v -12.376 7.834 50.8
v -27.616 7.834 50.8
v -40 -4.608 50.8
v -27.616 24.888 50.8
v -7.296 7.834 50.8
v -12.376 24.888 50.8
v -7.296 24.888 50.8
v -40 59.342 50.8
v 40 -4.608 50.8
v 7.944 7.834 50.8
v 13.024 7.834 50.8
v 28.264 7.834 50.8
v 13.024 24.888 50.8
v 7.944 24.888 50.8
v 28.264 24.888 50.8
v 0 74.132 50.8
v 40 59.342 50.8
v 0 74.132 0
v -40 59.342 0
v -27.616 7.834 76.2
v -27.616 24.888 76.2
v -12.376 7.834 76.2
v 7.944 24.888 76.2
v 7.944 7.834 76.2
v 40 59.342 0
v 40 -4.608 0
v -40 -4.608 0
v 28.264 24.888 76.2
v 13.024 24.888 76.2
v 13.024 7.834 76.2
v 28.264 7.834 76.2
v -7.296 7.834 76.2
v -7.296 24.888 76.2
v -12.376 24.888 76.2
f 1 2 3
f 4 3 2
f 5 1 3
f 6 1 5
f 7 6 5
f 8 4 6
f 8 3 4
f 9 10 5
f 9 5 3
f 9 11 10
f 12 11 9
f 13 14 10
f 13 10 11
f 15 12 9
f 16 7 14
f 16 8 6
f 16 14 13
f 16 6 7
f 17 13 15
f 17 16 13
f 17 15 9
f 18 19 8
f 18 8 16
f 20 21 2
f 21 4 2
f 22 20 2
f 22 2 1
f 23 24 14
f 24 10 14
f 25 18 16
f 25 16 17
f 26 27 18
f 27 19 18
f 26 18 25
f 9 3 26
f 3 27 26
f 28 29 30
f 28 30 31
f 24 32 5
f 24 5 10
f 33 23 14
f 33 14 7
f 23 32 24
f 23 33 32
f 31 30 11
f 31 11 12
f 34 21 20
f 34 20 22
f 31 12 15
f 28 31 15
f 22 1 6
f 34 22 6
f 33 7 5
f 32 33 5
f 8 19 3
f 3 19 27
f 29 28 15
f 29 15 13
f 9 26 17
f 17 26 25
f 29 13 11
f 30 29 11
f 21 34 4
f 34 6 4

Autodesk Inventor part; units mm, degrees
ref_plane "YZ Plane" through (0, 0, 0) normal (1, 0, 0) x (0, 1, 0)
ref_plane "XZ Plane" through (0, 0, 0) normal (0, 1, 0) x (-1, 0, 0)
ref_plane "XY Plane" through (0, 0, 0) normal (0, 0, 1) x (1, 0, 0)
sketch "Sketch1" plane through (0, 0, 0) normal (0, 0, 1) x (1, 0, 0)
  line L0 (-40, -4.6078) -> (40, -4.6078)
  line L1 (40, -4.6078) -> (40, 38.3746)
  line L2 (-40, 38.3746) -> (-40, -4.6078)
  line L3 (-40, 59.3419) -> (-40, 38.3746)
  line L4 (40, 59.3419) -> (40, 38.3746)
  line L5 (-40, 59.3419) -> (0, 74.1322)
  line L6 (0, 74.1322) -> (40, 59.3419)
  point P0 (0, 0)
  dimension "d0" = 80
  dimension "d5" = 78.74
extrude "Extrusion1" add sketch "Sketch1" along normal blind 50.8
sketch "Sketch4" plane through (0, 0, 50.8) normal (0, 0, 1) x (1, 0, 0)
  line L0 (-27.6156, 7.8338) -> (-12.3756, 7.8338)
  line L1 (-12.3756, 7.8338) -> (-12.3756, 24.8882)
  line L2 (-12.3756, 24.8882) -> (-27.6156, 24.8882)
  line L3 (-27.6156, 24.8882) -> (-27.6156, 7.8338)
  line L4 (-7.2956, 7.8338) -> (7.9444, 7.8338)
  line L5 (7.9444, 7.8338) -> (7.9444, 24.8882)
  line L6 (7.9444, 24.8882) -> (-7.2956, 24.8882)
  line L7 (-7.2956, 24.8882) -> (-7.2956, 7.8338)
  line L8 (13.0244, 7.8338) -> (28.2644, 7.8338)
  line L9 (28.2644, 7.8338) -> (28.2644, 24.8882)
  line L10 (28.2644, 24.8882) -> (13.0244, 24.8882)
  line L11 (13.0244, 24.8882) -> (13.0244, 7.8338)
  point P0 (0, 0)
  dimension "d17" = 15.24
  dimension "d19" = 15.24
  dimension "d21" = 15.24
extrude "Extrusion2" add sketch "Sketch4" along normal blind 25.4
properties part number "cwsumorobot"
